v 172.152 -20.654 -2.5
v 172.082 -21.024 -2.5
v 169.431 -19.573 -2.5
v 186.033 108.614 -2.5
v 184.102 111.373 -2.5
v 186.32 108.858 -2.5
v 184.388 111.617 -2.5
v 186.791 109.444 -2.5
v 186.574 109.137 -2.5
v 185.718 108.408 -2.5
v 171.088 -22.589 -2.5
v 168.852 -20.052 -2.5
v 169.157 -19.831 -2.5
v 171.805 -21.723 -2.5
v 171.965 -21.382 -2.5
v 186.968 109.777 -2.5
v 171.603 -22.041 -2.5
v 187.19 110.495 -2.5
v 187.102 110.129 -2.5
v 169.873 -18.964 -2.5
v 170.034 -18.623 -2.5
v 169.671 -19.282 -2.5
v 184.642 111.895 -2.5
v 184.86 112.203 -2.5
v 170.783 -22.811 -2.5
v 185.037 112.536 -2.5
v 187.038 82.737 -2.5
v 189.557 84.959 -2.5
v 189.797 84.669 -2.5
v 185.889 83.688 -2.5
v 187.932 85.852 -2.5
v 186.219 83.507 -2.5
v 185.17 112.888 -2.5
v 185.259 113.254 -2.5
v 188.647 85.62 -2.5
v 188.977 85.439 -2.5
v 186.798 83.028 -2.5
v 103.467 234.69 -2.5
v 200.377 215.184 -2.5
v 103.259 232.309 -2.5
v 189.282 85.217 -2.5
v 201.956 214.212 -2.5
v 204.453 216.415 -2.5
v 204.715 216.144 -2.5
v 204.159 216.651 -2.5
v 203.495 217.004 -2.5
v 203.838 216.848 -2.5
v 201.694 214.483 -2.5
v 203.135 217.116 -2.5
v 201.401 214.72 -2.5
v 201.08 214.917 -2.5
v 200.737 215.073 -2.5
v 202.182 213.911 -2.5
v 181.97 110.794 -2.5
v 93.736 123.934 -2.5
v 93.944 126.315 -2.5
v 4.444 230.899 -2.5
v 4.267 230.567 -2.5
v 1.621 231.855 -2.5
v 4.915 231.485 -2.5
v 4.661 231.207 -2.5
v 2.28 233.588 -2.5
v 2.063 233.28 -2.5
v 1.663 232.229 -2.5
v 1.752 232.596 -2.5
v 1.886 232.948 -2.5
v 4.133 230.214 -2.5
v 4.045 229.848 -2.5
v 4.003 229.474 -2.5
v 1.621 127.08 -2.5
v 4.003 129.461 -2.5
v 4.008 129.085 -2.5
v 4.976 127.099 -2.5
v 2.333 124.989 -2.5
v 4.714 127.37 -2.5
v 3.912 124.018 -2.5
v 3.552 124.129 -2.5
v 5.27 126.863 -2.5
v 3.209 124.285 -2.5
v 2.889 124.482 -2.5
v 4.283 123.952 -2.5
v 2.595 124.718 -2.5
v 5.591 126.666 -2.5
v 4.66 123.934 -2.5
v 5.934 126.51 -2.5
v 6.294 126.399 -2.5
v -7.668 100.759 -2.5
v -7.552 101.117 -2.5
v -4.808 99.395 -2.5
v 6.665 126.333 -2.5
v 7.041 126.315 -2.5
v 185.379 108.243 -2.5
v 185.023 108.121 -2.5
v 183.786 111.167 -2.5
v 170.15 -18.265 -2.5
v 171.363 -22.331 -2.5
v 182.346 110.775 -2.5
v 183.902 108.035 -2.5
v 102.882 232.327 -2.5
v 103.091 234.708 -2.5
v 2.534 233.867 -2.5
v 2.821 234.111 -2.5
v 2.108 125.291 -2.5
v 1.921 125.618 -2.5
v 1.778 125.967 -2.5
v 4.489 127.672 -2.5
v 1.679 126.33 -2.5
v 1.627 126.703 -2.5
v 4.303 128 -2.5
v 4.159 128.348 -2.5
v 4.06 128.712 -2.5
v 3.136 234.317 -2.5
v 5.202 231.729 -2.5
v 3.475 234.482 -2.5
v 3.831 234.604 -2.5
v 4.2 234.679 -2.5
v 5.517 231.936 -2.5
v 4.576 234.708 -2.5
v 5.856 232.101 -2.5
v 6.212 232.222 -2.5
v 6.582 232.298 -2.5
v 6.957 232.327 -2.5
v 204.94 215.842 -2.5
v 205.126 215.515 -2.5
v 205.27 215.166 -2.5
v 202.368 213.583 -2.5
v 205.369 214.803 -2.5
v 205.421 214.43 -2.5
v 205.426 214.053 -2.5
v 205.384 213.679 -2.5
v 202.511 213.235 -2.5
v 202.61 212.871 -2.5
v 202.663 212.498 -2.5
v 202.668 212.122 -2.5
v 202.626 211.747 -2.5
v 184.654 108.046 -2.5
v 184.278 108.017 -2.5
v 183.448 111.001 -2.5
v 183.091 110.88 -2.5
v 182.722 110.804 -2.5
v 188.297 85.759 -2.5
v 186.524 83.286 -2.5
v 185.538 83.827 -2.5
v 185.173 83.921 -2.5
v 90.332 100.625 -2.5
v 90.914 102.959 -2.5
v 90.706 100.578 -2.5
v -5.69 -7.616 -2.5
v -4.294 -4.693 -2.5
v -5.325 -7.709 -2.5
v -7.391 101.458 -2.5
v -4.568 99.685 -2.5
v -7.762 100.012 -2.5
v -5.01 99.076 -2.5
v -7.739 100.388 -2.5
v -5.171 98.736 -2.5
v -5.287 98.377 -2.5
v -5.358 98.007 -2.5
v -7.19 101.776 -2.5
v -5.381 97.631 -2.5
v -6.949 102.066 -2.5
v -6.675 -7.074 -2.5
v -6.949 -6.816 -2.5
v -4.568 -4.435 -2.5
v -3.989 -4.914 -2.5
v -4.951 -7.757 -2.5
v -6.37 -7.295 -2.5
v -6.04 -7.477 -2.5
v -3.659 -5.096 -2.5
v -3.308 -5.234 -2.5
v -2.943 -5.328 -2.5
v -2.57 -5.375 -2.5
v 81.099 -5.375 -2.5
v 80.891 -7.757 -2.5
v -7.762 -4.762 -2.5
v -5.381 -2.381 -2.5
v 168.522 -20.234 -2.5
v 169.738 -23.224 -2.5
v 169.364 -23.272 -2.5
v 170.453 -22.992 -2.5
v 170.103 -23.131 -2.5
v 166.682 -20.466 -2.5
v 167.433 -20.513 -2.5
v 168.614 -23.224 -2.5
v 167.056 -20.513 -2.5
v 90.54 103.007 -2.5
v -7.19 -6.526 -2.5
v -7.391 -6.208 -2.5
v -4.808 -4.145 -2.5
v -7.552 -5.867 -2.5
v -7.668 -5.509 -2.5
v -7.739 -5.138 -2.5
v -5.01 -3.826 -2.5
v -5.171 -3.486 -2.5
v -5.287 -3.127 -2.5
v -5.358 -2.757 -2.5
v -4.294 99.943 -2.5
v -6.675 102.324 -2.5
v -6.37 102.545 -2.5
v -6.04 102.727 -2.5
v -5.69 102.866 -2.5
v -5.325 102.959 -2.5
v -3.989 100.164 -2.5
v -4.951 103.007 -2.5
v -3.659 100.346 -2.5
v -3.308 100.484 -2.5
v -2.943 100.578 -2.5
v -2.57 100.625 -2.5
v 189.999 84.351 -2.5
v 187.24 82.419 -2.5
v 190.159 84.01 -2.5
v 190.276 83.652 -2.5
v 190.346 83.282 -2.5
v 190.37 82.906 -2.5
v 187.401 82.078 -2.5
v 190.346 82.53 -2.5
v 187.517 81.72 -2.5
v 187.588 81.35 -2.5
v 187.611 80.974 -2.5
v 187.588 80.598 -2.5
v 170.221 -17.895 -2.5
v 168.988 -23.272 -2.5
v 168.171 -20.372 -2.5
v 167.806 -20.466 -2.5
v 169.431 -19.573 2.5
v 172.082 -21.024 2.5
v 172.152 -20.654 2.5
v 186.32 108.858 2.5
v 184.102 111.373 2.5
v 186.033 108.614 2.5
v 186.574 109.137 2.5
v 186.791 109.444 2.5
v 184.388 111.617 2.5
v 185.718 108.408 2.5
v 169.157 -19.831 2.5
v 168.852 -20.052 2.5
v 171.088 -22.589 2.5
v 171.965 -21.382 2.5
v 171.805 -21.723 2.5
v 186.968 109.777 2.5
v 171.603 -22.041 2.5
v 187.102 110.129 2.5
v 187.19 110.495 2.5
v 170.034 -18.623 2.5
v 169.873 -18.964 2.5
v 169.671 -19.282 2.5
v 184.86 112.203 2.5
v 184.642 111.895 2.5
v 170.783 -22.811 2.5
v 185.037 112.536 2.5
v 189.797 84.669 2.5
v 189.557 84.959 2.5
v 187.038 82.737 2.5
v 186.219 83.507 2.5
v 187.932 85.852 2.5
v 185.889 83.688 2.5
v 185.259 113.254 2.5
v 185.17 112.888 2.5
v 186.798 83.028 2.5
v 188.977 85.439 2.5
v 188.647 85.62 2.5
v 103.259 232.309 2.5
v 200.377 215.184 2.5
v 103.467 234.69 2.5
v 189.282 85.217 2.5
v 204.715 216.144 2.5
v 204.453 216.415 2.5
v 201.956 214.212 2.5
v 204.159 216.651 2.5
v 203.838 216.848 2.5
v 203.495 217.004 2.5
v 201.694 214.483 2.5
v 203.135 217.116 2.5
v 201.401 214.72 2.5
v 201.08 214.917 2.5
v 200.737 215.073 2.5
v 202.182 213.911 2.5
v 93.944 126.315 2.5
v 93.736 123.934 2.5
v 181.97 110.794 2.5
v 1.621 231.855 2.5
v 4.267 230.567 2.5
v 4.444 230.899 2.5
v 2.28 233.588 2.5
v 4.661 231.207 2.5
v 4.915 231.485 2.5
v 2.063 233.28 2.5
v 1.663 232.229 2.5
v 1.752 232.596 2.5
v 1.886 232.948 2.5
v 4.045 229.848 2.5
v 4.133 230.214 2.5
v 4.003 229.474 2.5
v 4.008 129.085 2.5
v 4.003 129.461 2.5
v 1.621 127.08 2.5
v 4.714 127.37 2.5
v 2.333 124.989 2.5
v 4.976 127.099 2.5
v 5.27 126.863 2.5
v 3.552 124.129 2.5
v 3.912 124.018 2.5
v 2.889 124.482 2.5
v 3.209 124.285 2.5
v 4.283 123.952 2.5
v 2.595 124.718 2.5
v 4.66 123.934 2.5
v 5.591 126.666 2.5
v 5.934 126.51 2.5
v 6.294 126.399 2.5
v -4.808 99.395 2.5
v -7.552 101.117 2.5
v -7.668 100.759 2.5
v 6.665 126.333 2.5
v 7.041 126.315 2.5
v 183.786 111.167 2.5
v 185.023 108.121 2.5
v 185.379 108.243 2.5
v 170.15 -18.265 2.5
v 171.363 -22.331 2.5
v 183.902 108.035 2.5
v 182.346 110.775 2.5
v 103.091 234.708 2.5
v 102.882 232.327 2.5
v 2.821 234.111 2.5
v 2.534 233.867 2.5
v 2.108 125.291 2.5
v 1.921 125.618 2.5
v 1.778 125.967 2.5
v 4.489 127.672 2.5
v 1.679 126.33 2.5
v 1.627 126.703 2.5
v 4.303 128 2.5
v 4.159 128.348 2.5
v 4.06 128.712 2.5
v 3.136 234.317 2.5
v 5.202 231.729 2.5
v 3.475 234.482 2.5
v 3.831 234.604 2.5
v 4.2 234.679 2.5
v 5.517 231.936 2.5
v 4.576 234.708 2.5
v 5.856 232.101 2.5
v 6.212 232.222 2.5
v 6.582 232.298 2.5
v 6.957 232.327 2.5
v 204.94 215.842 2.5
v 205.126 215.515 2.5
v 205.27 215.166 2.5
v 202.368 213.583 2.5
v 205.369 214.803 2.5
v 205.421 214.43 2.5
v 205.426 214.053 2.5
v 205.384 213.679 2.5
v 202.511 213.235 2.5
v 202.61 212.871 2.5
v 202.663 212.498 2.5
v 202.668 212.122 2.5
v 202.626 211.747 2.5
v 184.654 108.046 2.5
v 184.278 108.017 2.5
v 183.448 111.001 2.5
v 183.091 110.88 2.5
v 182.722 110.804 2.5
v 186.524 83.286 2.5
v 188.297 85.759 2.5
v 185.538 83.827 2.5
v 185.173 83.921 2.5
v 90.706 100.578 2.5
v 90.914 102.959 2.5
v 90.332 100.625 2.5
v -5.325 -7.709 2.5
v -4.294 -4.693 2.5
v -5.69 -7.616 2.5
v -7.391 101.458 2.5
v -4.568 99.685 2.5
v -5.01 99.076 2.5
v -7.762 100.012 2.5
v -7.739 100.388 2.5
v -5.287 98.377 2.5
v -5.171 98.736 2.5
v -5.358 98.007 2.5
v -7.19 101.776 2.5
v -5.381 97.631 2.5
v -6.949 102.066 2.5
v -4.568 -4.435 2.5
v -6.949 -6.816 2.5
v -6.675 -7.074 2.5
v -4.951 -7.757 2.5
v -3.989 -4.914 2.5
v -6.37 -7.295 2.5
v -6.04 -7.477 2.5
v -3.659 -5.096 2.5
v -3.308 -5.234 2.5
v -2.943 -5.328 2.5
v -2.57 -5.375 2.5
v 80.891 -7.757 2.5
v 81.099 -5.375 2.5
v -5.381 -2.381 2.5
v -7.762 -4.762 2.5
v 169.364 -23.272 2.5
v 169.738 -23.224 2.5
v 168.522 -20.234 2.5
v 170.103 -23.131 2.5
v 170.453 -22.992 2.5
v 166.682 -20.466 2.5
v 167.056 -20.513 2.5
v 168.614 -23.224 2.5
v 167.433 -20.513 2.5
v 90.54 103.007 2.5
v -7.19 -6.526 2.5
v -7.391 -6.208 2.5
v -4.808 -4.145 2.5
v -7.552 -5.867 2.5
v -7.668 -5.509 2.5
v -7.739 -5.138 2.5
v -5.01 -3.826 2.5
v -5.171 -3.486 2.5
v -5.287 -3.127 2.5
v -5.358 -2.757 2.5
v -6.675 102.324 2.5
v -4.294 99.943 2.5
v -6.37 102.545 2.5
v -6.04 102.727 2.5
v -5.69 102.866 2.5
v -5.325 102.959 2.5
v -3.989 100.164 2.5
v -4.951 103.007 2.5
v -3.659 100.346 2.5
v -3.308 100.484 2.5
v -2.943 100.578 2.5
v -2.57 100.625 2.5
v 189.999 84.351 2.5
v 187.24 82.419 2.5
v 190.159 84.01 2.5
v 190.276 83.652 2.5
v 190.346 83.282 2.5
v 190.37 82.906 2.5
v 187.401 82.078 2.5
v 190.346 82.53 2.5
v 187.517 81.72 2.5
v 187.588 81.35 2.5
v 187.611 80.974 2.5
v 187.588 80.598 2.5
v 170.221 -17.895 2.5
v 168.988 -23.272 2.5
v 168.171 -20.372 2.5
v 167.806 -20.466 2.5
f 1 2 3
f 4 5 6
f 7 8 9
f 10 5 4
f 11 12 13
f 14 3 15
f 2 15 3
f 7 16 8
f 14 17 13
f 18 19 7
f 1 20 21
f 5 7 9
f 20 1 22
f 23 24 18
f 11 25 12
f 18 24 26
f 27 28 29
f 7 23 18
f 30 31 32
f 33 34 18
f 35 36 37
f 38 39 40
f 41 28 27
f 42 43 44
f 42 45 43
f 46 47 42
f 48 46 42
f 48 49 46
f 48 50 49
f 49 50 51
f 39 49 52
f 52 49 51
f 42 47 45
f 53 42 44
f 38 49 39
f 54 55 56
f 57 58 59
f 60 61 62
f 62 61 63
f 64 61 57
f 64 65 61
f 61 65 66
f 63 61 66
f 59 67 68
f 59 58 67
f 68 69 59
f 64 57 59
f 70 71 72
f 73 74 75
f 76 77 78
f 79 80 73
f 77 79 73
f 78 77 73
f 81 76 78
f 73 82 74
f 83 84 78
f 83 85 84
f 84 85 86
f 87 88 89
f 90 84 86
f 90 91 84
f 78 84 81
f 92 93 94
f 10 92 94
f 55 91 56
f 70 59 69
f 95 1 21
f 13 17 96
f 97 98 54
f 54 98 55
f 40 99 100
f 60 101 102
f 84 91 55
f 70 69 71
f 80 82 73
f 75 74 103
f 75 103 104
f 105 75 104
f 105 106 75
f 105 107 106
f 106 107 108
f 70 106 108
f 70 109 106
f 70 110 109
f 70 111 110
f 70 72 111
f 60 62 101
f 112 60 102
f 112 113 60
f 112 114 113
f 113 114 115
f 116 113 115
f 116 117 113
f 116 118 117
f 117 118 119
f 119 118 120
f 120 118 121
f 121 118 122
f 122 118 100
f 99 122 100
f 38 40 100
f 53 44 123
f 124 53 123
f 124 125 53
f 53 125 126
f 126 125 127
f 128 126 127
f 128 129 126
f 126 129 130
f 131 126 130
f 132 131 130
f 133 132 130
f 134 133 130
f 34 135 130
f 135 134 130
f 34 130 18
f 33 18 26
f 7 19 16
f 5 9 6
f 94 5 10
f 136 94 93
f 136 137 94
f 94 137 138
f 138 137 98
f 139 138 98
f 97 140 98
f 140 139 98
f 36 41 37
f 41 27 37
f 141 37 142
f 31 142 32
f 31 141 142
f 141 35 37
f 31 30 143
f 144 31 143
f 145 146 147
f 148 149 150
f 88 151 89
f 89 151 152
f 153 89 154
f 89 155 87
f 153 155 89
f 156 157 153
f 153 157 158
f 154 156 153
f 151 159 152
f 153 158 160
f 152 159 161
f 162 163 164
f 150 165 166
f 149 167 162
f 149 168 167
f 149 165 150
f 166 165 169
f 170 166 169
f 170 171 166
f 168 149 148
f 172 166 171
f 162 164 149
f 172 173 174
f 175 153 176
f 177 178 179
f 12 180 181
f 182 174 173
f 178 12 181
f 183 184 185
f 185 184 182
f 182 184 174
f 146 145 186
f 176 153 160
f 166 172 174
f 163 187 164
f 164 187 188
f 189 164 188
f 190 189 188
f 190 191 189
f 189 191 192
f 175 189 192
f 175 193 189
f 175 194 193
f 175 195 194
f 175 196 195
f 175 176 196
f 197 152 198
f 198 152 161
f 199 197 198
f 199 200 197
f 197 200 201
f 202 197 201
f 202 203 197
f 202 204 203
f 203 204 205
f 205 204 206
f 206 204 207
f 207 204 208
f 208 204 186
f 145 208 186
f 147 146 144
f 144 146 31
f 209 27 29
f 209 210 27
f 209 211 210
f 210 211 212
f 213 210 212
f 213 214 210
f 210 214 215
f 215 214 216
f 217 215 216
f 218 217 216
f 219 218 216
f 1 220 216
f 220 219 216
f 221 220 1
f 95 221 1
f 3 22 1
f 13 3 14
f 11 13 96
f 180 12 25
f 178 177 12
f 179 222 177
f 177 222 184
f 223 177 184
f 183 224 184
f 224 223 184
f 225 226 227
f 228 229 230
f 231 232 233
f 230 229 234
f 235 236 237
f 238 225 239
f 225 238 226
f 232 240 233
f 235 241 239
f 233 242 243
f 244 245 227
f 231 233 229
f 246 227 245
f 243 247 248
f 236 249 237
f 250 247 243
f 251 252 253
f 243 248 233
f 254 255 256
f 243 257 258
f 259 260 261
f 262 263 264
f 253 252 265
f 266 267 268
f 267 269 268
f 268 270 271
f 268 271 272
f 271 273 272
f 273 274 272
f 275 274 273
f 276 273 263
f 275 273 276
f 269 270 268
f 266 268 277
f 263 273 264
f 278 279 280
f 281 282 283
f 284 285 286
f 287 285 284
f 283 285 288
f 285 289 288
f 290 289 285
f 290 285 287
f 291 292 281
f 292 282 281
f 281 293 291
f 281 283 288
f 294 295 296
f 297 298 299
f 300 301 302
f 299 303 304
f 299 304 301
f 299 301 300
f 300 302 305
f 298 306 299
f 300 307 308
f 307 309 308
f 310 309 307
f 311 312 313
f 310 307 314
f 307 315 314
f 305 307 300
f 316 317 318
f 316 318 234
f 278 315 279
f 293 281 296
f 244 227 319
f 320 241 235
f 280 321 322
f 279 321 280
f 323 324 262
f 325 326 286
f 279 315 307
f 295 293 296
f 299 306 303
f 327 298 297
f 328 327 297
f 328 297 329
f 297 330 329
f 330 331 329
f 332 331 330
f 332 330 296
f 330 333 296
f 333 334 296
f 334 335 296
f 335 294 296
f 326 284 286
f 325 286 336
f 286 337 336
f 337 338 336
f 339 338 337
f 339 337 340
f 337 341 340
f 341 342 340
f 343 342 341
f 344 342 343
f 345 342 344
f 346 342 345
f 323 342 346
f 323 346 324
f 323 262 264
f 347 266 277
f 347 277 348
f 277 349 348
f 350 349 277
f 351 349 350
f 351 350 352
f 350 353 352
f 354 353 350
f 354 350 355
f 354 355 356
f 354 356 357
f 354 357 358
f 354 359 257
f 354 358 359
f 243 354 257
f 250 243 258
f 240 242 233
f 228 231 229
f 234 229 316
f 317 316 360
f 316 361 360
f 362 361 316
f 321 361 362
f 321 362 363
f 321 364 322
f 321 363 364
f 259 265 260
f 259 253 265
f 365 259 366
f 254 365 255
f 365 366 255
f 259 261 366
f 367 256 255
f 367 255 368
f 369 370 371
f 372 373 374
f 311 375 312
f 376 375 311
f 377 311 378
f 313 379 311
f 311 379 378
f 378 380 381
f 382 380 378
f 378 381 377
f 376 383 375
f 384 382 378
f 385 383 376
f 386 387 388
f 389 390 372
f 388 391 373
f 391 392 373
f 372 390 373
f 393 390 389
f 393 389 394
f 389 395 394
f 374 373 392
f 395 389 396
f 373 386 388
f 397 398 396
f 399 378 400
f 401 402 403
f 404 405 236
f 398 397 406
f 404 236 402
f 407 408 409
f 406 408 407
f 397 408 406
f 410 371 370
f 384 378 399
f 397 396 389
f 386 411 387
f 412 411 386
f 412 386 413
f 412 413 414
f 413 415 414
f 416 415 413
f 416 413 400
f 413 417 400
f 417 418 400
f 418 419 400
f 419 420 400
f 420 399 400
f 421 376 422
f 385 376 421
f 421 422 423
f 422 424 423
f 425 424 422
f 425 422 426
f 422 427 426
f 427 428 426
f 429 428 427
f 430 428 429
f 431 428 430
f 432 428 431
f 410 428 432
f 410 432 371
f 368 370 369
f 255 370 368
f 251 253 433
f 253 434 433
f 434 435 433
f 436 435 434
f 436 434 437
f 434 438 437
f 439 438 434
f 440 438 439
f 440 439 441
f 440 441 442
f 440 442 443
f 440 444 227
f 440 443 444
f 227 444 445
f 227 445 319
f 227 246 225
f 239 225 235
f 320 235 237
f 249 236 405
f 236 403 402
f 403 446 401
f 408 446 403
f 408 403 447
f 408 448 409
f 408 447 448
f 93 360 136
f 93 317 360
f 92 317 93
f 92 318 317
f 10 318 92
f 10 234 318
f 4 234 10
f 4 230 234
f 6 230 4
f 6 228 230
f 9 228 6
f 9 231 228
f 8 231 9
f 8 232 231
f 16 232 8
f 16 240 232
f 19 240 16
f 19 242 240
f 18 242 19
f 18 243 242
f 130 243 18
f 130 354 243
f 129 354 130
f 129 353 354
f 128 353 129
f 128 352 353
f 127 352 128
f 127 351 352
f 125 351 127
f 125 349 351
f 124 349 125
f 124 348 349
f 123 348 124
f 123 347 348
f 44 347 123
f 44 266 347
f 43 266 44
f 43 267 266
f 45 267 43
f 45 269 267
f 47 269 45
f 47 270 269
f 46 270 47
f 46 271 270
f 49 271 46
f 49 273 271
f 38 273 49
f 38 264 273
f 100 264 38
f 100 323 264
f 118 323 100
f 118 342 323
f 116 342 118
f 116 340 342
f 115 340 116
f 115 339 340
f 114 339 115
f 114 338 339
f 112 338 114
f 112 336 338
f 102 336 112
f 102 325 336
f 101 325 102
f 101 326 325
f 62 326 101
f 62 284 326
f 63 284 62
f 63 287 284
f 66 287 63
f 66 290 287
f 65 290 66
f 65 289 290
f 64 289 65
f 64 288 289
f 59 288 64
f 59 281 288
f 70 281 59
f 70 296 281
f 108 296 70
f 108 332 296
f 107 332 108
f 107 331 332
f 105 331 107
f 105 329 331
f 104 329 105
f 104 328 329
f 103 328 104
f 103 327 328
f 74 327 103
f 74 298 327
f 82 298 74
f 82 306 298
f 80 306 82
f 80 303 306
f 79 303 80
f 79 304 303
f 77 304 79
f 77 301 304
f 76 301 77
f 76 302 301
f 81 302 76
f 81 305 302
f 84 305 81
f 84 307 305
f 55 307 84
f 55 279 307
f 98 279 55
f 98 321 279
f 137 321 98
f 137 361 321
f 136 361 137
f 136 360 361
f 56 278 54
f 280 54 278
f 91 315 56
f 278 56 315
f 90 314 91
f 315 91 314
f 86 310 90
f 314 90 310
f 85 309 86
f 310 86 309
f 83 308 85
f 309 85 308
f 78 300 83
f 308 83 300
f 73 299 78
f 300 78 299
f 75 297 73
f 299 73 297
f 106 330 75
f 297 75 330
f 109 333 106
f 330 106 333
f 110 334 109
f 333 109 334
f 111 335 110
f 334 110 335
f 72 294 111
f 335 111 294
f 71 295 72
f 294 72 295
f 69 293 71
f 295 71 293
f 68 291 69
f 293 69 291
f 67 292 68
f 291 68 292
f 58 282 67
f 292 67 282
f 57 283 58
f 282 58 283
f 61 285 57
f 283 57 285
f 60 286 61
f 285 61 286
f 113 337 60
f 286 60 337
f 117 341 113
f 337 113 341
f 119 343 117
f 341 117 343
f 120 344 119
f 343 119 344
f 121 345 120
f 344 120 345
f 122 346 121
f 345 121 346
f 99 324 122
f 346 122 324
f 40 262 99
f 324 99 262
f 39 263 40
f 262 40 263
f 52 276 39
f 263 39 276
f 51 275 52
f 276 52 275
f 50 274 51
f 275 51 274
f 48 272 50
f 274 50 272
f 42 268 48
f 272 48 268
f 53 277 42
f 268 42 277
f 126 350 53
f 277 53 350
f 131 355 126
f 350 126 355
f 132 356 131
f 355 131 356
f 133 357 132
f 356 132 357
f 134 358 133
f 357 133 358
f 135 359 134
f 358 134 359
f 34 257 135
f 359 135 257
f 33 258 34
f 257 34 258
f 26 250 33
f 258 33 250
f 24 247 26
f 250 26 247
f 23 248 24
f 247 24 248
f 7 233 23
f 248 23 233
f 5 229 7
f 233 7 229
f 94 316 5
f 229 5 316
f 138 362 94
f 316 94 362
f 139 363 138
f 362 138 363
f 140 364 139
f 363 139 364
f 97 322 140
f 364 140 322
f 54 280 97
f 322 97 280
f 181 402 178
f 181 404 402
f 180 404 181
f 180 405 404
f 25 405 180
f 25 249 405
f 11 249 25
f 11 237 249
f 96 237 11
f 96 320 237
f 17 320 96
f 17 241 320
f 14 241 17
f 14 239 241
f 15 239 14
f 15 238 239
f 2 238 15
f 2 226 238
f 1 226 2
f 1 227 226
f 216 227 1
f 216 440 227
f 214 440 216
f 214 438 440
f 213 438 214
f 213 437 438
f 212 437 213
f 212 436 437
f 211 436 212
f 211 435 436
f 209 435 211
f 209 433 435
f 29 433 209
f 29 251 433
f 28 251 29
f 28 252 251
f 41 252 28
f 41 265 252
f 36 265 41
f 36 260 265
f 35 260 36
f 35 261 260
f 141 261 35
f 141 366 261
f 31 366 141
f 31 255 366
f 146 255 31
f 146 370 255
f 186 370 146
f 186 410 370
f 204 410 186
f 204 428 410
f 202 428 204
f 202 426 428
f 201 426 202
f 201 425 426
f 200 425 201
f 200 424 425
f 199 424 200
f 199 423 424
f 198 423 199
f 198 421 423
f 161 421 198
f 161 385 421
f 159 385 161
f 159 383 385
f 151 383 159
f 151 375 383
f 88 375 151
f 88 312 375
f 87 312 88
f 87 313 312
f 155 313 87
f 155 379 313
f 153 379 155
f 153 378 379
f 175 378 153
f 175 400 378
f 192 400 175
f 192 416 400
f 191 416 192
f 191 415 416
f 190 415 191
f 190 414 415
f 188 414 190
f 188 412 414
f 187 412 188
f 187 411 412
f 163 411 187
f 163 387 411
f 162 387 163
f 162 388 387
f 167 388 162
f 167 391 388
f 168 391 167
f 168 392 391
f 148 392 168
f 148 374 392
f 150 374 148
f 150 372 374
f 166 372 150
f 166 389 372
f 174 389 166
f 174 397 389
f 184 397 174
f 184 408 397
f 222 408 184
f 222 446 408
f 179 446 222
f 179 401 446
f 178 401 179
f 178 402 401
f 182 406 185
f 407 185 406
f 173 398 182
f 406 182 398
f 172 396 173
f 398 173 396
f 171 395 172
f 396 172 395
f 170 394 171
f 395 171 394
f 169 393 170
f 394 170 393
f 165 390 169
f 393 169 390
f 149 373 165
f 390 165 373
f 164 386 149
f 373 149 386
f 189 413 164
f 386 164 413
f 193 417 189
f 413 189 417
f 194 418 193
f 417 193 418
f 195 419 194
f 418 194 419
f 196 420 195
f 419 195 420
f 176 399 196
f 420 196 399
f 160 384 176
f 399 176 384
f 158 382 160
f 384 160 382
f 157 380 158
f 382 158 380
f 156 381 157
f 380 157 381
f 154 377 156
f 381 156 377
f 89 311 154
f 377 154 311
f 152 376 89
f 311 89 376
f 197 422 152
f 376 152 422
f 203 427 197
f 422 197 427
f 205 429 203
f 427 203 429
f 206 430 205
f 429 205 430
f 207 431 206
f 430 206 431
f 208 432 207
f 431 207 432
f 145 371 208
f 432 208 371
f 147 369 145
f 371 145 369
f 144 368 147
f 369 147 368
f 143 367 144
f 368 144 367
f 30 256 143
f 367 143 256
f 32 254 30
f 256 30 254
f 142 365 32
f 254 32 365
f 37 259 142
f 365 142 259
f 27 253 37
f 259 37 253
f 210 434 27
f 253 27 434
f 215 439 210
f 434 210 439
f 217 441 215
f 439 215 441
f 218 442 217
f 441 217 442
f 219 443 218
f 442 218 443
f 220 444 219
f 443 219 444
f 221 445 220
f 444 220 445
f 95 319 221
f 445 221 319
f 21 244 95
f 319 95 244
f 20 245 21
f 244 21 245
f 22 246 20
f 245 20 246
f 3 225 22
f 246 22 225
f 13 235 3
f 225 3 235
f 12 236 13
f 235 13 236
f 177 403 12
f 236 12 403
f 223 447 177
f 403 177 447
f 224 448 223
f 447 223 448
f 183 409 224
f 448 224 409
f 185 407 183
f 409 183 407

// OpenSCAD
// file: const.scad
KNOB_LEFT = 1;
KNOB_RIGHT = 2;

TYPE_A = "A";
TYPE_B = "B";
TYPE_C = "C";
// main file
include <base.scad>;

linear_extrude(height=PLATE_HEIGHT, center=true)
    union() {
        difference() {
            left(TYPE_C, PADDING);
            left(TYPE_C, 0.5*PADDING);
        };

        difference() {
            right(TYPE_C, PADDING);
            right(TYPE_C, 0.5*PADDING);
        };
    };
